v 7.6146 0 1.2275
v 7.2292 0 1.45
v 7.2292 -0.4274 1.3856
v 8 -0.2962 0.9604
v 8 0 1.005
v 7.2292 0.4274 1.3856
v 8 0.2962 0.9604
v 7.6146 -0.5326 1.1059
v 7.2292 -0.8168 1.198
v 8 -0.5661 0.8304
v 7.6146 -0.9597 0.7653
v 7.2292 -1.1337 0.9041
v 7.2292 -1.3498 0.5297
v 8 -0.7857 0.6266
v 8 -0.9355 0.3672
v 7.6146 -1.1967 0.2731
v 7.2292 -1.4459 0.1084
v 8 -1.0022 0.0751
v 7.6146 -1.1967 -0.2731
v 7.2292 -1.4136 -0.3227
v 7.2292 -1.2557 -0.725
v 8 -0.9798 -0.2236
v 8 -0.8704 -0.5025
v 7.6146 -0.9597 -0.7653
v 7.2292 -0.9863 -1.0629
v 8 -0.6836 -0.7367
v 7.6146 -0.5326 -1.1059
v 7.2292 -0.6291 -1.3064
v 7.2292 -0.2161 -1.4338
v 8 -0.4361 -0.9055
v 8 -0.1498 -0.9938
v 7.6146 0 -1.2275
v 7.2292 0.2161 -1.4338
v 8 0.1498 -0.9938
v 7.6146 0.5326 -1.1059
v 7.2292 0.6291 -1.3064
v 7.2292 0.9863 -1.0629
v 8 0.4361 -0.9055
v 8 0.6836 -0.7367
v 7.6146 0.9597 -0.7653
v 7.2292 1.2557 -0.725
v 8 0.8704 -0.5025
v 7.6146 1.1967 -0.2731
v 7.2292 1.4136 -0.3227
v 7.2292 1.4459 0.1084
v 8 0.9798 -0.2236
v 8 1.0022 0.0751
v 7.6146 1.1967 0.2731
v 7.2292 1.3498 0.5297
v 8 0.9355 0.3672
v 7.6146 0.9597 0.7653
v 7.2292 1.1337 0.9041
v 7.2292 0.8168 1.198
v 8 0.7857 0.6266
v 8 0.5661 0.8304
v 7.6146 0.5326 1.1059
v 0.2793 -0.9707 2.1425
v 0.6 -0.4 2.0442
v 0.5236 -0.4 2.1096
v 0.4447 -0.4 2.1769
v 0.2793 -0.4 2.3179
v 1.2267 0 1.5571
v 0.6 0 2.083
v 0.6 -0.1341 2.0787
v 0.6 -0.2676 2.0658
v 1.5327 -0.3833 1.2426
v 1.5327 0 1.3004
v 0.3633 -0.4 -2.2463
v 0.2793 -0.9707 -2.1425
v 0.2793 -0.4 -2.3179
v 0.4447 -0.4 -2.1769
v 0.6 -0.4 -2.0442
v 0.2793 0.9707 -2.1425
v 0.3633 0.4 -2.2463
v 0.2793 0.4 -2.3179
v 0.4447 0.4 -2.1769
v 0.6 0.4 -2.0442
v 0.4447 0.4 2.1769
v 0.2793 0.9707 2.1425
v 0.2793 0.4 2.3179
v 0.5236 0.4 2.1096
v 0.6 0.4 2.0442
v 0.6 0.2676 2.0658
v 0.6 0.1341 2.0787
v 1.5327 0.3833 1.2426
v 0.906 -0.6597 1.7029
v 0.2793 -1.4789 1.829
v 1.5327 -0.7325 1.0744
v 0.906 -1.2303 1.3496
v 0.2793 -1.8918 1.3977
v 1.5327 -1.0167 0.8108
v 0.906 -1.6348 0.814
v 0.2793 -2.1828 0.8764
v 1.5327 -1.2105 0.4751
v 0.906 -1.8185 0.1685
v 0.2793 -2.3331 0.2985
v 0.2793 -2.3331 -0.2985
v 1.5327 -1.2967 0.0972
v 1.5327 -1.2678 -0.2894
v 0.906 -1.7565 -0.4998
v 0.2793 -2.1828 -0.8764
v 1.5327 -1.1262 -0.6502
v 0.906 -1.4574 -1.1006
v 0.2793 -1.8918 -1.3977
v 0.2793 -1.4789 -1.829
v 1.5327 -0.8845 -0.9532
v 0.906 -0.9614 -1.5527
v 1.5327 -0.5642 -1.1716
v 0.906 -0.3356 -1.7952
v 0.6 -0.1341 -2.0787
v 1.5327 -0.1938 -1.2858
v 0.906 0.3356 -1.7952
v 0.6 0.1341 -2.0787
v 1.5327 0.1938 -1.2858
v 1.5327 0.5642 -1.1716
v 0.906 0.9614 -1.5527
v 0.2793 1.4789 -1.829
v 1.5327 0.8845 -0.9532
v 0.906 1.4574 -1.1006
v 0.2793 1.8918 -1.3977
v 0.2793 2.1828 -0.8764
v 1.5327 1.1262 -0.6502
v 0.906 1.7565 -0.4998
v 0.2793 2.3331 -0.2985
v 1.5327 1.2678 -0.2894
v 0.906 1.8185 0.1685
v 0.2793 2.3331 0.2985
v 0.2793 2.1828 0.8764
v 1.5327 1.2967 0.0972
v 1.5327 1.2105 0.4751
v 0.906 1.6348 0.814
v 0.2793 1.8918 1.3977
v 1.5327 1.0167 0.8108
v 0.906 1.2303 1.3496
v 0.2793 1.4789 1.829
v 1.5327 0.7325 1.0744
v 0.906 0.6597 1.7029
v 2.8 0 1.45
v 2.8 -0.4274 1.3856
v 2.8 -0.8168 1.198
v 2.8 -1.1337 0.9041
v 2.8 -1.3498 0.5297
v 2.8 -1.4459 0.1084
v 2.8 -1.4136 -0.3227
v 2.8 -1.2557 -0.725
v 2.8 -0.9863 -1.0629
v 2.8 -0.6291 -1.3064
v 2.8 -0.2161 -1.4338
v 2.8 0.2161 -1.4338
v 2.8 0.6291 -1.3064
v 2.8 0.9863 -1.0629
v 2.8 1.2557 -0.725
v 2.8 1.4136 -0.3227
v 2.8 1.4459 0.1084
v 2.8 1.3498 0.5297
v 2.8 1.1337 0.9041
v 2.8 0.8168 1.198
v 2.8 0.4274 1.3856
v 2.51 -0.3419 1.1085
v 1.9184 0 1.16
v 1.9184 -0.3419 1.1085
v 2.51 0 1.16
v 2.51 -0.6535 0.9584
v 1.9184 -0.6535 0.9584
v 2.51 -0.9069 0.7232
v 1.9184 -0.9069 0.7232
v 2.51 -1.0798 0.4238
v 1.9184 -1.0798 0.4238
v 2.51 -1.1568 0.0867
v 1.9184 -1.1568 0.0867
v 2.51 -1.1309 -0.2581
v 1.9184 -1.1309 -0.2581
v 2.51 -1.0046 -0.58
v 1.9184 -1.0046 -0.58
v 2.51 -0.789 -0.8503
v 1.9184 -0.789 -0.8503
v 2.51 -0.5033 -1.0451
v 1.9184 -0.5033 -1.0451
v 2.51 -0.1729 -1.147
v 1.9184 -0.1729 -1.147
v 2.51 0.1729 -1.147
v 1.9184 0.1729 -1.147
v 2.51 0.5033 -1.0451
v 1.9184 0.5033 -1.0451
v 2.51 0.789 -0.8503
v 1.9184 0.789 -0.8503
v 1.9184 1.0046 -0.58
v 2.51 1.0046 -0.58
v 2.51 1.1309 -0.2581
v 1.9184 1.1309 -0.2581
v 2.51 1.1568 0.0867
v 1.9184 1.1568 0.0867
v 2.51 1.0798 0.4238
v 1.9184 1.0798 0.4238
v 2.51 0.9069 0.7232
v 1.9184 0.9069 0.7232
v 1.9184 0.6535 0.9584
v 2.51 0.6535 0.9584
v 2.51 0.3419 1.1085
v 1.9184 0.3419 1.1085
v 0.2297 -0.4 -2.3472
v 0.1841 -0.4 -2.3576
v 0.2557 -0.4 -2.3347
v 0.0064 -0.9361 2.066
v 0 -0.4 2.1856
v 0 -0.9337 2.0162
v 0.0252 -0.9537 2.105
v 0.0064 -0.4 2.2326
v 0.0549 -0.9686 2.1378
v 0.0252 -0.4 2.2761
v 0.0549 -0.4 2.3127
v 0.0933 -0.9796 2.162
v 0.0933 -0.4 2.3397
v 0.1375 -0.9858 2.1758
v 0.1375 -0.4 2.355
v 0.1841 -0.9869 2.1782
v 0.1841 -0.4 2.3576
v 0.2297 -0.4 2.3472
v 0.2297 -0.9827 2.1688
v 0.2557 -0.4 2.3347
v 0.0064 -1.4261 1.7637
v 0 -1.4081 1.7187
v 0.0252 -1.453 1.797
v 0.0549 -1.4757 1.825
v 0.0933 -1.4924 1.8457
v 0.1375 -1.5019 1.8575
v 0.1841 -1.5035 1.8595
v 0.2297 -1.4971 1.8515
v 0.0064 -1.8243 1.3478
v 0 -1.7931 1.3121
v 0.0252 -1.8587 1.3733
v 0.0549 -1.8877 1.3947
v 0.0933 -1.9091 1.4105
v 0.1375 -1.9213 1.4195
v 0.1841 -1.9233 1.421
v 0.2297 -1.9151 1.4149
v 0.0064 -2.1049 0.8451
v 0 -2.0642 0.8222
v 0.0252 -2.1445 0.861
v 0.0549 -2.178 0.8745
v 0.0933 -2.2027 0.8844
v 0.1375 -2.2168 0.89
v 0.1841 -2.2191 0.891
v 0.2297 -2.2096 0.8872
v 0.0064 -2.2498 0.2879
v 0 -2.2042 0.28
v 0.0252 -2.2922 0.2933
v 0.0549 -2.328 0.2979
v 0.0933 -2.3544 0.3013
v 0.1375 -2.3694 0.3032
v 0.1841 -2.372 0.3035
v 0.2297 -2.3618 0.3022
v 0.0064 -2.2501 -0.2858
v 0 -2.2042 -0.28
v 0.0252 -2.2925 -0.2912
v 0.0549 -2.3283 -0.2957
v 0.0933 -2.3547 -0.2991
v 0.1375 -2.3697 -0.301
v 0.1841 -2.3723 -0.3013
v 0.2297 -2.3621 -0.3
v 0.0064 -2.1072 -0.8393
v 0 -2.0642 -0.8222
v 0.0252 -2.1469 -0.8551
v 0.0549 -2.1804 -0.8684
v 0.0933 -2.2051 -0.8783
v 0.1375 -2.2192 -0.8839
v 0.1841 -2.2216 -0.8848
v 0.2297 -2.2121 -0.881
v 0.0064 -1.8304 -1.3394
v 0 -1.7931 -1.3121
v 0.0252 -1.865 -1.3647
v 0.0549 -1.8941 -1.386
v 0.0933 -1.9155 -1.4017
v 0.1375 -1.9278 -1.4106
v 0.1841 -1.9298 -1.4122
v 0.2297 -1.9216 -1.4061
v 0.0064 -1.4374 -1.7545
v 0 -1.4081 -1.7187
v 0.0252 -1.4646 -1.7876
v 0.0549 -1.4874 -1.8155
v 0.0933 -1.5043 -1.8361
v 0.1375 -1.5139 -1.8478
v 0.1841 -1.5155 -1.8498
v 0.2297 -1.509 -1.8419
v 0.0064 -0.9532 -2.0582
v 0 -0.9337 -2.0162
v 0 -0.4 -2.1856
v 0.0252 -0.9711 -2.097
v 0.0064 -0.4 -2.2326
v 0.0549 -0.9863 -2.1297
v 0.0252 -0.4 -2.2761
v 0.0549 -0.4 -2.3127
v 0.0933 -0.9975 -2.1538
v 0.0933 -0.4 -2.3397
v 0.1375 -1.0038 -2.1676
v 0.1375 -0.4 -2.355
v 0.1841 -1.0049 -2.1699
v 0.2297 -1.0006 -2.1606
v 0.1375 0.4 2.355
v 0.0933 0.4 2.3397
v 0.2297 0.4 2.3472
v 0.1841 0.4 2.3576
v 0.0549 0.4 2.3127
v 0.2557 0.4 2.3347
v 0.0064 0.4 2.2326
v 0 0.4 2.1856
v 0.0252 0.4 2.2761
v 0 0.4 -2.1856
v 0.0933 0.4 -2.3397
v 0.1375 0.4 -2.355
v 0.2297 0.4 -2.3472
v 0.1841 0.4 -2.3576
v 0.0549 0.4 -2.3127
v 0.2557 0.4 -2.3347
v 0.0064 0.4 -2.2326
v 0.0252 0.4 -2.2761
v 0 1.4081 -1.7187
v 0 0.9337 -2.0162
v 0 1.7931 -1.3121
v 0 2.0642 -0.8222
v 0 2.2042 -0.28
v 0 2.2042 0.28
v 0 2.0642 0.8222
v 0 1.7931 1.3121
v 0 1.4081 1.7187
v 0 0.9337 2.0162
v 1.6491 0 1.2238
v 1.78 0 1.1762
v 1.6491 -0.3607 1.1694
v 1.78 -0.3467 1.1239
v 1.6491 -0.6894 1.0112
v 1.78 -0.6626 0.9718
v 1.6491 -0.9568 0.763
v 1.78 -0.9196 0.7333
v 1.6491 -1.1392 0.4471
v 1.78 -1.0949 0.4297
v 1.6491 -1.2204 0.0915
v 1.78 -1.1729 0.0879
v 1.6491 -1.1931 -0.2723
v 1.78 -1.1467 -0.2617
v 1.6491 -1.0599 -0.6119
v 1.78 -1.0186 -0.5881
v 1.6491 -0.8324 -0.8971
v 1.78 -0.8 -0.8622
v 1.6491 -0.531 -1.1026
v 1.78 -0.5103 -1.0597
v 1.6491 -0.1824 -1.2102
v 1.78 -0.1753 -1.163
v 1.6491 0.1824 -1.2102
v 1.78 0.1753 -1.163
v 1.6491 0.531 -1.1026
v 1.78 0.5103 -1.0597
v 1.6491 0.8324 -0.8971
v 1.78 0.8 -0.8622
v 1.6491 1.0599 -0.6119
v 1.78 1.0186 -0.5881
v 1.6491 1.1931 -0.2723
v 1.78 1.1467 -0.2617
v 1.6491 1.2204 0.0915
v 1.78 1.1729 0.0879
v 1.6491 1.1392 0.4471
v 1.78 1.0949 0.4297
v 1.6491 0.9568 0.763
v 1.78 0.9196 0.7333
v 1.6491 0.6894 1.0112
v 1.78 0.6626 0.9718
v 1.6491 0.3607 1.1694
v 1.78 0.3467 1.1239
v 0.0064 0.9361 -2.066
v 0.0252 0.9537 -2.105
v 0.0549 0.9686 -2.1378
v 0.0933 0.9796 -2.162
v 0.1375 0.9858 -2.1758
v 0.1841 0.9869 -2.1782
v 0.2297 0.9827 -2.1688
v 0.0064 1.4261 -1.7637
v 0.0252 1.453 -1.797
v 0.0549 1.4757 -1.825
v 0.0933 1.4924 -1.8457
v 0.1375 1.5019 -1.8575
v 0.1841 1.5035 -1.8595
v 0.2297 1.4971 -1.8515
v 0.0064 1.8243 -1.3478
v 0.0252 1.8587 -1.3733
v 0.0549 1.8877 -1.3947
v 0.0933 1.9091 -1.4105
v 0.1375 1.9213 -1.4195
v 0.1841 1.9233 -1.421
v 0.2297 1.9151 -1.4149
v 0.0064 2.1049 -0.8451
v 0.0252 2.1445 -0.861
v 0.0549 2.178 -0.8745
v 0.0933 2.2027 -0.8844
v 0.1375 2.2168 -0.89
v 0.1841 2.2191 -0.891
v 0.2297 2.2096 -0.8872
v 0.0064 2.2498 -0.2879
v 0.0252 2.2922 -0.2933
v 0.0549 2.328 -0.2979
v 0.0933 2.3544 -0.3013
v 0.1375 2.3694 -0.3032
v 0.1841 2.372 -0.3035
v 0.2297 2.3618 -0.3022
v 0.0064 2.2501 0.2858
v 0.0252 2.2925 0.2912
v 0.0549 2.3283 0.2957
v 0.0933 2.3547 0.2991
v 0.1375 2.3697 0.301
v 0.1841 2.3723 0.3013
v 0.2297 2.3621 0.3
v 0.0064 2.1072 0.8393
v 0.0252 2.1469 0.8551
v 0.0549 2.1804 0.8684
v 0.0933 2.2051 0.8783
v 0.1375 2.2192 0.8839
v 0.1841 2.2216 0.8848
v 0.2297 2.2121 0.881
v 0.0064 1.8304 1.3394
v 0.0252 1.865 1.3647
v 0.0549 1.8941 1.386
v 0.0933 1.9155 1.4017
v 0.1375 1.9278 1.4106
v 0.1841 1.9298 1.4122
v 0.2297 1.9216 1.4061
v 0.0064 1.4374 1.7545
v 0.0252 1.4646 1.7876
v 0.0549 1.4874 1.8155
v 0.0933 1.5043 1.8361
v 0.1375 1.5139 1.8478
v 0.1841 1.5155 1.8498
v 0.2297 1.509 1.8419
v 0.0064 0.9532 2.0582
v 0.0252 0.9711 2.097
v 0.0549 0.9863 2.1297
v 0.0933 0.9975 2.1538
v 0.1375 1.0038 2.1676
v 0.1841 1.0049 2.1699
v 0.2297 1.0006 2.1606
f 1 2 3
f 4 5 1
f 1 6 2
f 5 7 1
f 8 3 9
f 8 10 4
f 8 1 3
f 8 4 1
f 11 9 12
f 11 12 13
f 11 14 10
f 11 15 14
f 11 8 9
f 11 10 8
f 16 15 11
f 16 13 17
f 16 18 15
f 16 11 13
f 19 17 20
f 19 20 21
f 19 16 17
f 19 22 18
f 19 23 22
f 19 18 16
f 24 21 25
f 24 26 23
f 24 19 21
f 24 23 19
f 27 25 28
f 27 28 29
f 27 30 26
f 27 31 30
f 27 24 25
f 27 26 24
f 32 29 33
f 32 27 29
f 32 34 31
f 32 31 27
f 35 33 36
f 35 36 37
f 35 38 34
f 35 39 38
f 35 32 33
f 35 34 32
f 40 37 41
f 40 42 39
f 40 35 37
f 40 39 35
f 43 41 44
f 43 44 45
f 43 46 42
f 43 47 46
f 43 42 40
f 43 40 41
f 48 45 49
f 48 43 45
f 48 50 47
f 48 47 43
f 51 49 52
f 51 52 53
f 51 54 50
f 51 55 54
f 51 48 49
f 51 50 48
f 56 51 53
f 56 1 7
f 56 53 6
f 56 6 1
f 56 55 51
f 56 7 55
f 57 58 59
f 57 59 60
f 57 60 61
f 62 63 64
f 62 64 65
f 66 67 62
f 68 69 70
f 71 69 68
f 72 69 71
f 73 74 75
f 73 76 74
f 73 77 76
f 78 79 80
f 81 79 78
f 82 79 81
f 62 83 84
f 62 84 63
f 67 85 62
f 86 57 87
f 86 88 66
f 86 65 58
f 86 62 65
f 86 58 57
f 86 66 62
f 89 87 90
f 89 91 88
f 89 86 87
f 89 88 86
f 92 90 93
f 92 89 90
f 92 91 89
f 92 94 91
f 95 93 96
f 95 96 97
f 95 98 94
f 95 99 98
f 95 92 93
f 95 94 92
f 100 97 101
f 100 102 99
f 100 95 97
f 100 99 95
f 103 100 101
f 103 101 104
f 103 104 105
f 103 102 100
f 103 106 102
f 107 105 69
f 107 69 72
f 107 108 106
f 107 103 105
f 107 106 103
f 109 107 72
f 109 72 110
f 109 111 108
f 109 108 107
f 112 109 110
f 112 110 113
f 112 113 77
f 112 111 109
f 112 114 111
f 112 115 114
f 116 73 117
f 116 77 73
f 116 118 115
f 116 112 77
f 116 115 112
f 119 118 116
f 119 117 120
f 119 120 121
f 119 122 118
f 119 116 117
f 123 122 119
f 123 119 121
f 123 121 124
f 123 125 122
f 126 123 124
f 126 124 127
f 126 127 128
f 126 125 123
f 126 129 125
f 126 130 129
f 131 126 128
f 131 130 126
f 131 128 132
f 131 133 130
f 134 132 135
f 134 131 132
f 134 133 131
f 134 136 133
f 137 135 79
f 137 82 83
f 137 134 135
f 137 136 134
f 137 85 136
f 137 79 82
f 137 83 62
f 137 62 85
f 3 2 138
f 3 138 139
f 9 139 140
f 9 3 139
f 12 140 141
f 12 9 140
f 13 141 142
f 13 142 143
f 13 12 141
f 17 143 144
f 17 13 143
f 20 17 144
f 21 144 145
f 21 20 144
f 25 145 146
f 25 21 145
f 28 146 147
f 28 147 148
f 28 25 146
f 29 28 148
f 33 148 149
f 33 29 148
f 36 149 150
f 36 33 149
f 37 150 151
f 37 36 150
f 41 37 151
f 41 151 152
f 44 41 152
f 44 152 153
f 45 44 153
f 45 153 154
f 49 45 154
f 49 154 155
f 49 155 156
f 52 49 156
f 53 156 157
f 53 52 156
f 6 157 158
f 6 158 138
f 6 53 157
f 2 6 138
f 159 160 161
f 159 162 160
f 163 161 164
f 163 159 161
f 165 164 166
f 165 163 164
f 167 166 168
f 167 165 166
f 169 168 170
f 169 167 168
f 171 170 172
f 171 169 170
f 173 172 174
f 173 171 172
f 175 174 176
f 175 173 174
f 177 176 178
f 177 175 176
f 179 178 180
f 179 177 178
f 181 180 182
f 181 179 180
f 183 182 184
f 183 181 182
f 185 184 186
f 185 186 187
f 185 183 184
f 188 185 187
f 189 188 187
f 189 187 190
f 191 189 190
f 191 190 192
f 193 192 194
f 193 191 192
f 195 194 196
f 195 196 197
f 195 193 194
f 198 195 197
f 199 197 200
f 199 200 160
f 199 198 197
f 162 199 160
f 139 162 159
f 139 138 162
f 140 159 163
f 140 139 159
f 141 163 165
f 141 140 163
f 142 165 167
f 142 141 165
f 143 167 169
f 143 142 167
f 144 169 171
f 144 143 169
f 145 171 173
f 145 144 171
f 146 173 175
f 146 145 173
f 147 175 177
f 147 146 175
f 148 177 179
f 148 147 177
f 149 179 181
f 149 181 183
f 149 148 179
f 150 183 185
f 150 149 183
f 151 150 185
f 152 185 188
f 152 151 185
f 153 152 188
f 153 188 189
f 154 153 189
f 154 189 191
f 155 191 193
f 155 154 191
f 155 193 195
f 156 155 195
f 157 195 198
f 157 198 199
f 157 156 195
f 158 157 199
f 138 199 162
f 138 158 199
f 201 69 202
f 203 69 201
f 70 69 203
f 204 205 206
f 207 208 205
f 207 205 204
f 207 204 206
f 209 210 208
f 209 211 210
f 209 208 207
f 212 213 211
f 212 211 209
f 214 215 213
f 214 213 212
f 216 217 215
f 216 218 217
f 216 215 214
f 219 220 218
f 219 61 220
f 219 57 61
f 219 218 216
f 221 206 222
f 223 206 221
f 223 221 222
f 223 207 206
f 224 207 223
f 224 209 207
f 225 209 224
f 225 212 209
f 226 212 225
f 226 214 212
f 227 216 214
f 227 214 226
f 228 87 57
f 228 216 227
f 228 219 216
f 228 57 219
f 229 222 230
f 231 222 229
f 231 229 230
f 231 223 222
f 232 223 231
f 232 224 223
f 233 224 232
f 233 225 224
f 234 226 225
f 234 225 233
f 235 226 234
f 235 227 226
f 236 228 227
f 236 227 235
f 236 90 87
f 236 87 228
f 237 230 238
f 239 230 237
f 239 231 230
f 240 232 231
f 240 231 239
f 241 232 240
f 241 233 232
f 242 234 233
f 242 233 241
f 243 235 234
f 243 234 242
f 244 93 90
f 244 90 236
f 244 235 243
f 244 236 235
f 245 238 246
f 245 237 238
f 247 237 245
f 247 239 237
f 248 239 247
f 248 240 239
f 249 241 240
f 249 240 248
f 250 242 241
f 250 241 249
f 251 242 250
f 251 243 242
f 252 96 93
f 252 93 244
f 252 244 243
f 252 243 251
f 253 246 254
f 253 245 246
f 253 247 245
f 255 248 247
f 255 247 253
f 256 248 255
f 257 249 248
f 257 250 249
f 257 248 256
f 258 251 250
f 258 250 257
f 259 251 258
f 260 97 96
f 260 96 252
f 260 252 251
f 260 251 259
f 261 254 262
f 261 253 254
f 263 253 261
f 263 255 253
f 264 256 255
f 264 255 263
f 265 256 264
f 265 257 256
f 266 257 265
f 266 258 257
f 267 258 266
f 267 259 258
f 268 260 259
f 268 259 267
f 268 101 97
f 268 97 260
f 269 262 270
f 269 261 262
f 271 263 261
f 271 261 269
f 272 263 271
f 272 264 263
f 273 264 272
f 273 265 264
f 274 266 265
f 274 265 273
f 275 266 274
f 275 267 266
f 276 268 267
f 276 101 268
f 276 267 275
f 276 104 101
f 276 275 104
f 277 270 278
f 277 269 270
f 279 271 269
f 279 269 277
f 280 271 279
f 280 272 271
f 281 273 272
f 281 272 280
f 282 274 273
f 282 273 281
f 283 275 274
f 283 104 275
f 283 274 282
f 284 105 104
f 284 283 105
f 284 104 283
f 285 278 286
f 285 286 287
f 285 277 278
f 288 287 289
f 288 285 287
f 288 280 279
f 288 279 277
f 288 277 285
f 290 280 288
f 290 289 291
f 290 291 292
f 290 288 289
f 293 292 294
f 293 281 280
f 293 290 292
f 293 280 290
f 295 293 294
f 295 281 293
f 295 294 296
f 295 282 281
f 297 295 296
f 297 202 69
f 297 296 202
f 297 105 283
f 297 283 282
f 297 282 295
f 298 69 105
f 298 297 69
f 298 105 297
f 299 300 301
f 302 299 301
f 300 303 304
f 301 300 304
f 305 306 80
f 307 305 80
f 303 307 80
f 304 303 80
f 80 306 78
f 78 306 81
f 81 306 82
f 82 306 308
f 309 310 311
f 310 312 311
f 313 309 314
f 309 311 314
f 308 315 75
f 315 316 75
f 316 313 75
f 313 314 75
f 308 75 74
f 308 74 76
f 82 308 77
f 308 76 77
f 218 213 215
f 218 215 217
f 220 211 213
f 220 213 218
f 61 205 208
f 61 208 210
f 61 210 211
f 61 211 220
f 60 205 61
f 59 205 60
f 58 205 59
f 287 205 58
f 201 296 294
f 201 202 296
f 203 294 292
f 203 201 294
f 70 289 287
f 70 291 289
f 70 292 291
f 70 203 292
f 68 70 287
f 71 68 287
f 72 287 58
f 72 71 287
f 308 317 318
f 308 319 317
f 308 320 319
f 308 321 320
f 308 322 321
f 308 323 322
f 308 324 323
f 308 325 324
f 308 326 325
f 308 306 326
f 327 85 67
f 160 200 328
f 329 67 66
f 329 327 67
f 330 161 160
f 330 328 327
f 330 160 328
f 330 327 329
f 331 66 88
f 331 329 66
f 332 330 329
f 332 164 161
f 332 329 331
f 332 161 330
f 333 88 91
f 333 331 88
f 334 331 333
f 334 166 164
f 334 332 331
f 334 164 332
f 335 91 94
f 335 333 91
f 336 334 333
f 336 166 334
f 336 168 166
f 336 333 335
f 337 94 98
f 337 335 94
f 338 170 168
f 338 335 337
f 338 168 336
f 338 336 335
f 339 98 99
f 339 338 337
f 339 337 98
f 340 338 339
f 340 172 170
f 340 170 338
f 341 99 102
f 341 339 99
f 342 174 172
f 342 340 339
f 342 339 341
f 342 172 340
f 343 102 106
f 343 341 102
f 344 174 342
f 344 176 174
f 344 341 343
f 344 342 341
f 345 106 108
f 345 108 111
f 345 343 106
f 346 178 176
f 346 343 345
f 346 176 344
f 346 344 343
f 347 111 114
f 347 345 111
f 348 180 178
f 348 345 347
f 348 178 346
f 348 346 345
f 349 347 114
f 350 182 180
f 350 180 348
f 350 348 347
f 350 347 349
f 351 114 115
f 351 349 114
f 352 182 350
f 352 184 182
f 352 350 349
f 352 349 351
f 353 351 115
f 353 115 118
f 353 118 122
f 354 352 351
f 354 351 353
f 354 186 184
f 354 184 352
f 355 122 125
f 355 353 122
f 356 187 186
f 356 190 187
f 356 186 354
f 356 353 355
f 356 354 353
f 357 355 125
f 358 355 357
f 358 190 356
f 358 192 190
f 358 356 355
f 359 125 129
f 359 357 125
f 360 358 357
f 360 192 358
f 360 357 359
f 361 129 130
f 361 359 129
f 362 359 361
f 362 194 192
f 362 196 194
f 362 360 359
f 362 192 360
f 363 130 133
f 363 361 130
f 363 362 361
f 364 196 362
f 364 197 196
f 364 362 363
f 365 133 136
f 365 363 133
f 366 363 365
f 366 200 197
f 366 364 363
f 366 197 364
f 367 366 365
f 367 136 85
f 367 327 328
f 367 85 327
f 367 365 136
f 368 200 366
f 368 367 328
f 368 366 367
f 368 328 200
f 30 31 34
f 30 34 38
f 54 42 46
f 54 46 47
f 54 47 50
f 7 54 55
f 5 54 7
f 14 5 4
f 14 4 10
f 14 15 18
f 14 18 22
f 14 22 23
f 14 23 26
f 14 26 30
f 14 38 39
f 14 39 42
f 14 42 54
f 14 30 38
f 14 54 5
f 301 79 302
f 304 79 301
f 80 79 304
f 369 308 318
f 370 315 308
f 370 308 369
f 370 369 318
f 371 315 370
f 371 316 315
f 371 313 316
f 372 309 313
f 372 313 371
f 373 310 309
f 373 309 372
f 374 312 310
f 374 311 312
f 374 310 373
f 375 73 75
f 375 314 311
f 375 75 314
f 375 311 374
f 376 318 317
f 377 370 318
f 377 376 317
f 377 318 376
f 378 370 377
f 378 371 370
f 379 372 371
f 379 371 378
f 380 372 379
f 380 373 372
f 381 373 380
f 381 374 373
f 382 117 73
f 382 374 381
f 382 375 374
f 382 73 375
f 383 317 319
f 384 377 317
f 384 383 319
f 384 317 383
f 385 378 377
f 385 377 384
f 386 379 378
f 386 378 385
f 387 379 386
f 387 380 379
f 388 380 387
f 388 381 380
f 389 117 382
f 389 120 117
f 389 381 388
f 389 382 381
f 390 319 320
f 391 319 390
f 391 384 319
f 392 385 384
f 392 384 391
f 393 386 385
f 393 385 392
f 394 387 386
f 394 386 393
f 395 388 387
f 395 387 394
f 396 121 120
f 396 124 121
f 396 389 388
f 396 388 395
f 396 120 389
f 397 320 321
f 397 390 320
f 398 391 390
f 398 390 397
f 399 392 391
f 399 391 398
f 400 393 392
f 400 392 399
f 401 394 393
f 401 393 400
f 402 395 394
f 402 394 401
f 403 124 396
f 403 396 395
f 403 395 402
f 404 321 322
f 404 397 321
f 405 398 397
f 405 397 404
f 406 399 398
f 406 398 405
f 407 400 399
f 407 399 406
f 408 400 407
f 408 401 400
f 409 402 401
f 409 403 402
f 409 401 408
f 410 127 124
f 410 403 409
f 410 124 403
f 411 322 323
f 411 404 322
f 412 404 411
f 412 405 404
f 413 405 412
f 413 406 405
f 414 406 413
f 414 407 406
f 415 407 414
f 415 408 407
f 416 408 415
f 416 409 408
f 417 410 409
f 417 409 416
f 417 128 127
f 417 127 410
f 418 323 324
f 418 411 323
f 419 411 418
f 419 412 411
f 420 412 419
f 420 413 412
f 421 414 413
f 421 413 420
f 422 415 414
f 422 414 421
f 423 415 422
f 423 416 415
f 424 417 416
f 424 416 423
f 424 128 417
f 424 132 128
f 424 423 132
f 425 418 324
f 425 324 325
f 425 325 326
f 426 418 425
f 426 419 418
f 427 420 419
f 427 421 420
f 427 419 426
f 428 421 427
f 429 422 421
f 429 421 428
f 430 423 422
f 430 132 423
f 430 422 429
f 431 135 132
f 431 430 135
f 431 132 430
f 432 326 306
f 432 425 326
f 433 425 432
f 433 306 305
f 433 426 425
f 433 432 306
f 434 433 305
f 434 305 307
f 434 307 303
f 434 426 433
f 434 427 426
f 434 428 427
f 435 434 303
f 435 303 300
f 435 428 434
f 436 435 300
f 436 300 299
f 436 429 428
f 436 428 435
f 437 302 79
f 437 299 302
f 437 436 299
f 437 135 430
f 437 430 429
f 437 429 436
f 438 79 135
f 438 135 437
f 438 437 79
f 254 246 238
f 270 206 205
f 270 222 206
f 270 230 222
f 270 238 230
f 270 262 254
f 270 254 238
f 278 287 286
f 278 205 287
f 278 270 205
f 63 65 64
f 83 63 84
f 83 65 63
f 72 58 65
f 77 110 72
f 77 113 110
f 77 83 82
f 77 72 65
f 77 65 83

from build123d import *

# Parameters (mm, degrees)
SLOT_CUT_EXTRUDE1_DEPTH      = 9.685758617
SLOT_CUT_EXTRUDE1_DEPTH_BACK = 9.685758617
SKETCH2_W                    = 0.6
SKETCH2_H                    = 0.8


with BuildPart() as part:
    # Sketch1 → base-Revolve (revolve)
    with BuildSketch(Plane.XY, mode=Mode.PRIVATE) as base_revolve_sk:
        with BuildLine():
            Line((0, 0), (0, 2.221903197))
            ThreePointArc((0, 2.221903197), (0.098154896, 2.37597552), (0.279273894, 2.352130752))
            Line((0.279273894, 2.352130752), (1.532709575, 1.300373334))
            ThreePointArc((1.532709575, 1.300373334), (1.713170055, 1.196184428), (1.918382141, 1.16))
            Line((1.918382141, 1.16), (2.51, 1.16))
            Line((2.51, 1.16), (2.8, 1.45))
            Line((2.8, 1.45), (8, 1.45))
            Line((8, 1.45), (8, 0))
            Line((8, 0), (0, 0))
        make_face()
    revolve(base_revolve_sk.sketch.rotate(Axis((0, 0, 0), (1, 0, 0)), 90), axis=Axis((0, 0, 0), (1, 0, 0)))

    # Sketch2 → slot_Cut-Extrude1 (cut, two sides: drawn at the far end of the back side and taken through both)
    with BuildSketch(Plane.XY.offset(-SLOT_CUT_EXTRUDE1_DEPTH_BACK)):
        with Locations((0.3, 0)):
            Rectangle(SKETCH2_W, SKETCH2_H)
    extrude(amount=SLOT_CUT_EXTRUDE1_DEPTH + SLOT_CUT_EXTRUDE1_DEPTH_BACK, mode=Mode.SUBTRACT)

    # Sketch8 → point_Cut-Revolve1 (revolve, cut)
    with BuildSketch(Plane.XY, mode=Mode.PRIVATE) as point_cut_revolve1_sk:
        Polygon((8, 0), (8.508, 0), (8.508, 1.958), (7.229237391, 1.958), (7.229237391, 1.45), (8, 1.005), align=None)
    revolve(point_cut_revolve1_sk.sketch.rotate(Axis((0, 0, 0), (1, 0, 0)), 90), axis=Axis((0, 0, 0), (1, 0, 0)), mode=Mode.SUBTRACT)


solid = part.part
